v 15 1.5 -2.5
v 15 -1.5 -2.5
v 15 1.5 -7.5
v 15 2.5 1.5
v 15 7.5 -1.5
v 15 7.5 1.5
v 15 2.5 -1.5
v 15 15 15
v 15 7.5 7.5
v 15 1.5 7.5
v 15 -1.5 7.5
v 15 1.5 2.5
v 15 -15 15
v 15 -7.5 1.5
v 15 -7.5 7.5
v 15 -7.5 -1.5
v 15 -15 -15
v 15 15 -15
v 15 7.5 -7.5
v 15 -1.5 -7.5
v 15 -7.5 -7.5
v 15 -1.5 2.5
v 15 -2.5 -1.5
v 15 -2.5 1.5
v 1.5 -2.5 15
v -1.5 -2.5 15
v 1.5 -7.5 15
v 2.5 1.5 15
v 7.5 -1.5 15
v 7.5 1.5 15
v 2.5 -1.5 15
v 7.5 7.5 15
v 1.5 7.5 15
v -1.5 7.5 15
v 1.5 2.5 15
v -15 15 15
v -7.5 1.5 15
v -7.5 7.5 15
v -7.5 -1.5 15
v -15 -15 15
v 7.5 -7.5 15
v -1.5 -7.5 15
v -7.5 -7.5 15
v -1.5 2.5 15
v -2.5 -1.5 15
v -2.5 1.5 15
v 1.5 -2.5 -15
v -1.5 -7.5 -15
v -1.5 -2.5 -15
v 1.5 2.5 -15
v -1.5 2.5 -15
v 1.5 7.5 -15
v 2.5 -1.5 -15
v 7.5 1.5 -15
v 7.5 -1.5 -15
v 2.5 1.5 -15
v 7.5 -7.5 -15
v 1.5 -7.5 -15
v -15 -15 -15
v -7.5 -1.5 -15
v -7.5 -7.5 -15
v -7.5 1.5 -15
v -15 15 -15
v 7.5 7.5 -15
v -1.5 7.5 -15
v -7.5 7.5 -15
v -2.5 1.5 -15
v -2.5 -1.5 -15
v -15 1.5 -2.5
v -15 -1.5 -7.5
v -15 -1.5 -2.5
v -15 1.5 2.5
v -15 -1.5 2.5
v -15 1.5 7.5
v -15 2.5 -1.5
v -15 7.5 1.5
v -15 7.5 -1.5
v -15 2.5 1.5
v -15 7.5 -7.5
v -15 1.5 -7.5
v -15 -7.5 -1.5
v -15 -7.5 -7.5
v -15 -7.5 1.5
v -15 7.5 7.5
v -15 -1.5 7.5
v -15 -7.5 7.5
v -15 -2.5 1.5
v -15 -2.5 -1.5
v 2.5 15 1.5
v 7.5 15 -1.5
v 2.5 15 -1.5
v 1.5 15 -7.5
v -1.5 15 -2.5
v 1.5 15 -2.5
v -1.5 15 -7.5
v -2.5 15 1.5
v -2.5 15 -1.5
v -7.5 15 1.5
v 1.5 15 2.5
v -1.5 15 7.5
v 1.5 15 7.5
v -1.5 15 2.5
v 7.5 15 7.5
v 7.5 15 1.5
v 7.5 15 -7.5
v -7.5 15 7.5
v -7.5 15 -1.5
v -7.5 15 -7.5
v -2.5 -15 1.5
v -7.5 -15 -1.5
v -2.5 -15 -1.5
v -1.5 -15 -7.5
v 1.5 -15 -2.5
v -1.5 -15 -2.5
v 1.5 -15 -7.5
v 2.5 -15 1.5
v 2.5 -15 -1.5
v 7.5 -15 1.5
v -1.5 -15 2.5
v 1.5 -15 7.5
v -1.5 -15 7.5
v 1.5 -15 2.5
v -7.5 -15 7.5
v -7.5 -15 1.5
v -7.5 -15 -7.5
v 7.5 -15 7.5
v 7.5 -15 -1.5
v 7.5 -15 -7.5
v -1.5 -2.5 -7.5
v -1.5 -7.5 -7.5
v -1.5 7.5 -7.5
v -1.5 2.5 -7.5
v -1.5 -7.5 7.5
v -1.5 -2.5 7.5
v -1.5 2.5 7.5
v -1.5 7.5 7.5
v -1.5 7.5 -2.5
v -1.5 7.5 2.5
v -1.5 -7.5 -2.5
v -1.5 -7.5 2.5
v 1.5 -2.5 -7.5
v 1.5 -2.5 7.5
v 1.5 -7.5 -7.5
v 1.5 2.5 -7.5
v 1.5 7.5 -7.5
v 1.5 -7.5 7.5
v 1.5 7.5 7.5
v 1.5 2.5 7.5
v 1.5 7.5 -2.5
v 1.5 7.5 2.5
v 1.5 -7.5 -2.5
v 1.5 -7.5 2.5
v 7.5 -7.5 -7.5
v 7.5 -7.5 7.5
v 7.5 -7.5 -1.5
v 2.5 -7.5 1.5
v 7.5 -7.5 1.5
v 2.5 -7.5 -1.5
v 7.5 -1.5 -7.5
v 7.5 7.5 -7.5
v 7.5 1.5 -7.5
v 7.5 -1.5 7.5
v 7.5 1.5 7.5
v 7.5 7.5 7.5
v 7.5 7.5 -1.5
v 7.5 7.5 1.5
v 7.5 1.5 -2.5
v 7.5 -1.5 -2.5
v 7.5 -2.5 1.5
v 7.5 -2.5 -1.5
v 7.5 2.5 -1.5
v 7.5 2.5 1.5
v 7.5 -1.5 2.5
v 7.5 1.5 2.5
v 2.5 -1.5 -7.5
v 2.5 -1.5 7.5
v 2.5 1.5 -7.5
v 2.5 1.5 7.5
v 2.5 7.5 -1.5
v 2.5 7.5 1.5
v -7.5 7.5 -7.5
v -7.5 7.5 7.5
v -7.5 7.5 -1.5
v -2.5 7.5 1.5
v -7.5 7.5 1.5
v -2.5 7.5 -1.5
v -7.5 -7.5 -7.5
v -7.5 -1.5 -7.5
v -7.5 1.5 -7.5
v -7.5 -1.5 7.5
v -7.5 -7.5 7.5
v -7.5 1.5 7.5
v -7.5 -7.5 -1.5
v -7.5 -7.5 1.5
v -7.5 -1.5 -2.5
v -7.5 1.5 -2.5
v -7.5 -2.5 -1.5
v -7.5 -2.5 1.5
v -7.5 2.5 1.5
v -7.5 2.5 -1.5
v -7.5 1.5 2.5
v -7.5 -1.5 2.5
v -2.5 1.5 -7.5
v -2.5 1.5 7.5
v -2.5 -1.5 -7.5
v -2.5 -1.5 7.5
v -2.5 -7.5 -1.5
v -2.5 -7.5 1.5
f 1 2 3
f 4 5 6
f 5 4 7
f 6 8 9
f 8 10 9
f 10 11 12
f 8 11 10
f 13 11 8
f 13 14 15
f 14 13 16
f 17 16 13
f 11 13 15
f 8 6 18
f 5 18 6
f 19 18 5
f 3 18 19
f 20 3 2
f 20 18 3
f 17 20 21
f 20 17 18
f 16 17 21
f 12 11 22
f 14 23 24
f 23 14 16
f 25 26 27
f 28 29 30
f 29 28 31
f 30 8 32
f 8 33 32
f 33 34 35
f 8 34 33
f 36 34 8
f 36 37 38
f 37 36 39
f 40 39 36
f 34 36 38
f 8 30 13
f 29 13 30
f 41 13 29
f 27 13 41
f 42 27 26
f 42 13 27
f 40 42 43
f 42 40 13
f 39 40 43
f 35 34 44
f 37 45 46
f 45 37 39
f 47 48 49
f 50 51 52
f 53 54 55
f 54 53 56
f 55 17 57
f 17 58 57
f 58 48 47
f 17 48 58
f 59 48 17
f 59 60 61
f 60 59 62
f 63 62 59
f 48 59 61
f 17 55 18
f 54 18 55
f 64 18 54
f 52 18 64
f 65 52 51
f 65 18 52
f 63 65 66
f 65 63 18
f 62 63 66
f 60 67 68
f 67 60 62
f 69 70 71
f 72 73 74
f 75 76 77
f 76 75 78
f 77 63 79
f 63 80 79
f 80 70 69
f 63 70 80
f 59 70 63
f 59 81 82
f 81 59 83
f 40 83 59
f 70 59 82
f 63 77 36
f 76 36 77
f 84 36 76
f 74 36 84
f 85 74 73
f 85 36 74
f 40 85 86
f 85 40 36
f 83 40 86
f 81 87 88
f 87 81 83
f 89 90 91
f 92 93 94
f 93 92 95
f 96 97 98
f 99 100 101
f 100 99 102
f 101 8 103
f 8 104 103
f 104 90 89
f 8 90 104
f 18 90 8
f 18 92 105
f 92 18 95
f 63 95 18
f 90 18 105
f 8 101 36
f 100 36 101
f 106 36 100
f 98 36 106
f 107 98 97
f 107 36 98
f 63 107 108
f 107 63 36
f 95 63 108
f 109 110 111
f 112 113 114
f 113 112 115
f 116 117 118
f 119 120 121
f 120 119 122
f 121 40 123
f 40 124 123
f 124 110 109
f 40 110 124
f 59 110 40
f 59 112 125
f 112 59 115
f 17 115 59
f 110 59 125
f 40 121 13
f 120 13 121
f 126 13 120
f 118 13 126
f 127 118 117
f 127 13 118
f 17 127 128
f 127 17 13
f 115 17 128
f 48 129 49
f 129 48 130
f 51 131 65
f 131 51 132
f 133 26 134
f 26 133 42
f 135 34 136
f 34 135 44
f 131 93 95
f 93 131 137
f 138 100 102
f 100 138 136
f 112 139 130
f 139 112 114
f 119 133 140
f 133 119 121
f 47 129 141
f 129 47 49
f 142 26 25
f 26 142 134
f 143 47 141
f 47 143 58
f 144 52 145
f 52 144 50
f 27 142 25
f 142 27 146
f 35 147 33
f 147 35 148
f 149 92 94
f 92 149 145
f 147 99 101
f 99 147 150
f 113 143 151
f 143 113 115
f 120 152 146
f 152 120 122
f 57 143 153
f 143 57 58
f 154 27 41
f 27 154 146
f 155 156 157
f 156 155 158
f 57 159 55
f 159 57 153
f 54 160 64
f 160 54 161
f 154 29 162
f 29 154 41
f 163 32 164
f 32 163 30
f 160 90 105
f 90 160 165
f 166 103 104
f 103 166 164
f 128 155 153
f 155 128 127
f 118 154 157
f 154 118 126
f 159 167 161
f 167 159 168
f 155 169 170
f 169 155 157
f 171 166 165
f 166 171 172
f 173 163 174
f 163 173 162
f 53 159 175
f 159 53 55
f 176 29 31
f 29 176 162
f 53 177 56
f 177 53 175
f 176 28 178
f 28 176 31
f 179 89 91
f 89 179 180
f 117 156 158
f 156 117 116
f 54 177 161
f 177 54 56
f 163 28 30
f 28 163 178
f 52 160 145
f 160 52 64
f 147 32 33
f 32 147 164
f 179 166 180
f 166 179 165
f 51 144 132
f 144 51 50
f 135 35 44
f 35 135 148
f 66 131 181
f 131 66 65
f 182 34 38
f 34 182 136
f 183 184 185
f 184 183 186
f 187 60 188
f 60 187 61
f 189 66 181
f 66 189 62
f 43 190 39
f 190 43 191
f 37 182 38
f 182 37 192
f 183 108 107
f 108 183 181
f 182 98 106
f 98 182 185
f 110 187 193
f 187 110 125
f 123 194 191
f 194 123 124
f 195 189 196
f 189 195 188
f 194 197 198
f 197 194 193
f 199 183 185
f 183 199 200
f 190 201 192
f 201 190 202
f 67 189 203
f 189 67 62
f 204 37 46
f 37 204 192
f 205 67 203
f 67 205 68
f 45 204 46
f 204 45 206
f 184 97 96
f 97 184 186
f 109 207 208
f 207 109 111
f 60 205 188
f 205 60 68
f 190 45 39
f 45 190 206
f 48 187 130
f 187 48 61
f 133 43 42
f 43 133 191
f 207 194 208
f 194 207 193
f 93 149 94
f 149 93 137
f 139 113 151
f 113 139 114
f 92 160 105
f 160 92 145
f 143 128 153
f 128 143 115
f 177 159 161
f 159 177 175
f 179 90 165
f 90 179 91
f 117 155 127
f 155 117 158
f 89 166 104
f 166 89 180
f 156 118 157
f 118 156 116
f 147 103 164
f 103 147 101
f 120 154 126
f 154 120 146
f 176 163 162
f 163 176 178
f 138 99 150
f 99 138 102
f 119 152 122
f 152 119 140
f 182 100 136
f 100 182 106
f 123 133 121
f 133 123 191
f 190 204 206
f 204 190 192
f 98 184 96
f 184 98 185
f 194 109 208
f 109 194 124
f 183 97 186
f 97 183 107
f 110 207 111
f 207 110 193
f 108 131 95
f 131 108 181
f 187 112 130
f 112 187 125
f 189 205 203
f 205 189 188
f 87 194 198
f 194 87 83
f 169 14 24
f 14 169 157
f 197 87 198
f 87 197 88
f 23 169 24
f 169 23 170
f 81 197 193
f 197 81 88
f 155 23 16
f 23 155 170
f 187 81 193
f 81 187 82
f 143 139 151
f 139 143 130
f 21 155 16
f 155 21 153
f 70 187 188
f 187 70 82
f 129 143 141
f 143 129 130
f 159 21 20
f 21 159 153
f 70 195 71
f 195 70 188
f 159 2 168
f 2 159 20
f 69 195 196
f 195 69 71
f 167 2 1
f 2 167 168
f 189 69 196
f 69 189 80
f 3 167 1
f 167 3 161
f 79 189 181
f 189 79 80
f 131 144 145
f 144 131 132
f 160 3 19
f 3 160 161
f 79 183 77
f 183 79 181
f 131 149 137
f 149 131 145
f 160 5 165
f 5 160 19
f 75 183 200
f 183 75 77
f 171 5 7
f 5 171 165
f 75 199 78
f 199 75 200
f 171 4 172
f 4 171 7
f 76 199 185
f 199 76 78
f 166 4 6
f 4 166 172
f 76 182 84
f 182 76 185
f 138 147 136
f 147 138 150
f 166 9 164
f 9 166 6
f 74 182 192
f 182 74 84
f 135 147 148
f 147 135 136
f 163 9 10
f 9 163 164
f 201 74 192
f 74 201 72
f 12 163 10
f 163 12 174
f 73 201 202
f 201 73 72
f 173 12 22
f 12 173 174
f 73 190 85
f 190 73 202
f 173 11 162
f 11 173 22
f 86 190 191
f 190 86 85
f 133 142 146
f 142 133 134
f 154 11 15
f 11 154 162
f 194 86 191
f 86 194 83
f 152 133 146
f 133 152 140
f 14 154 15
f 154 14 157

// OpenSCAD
IN_MM = 25.4;
$fn = 32;

wall_th = 2;

beam_w = 15;
beam_notch_d = 5;
beam_notch_w = 3;
beam_hole_or = 3/2;

module beam(length=50) {
    translate([0, 0, -length/2])
    linear_extrude(length) {
        difference() {
            square([beam_w, beam_w], center=true);
            for (i=[0:3]) {
                rotate([0, 0, 90 * i]) {
                    translate([beam_w/2 - beam_notch_d / 2, 0, 0]) {
                        square([beam_notch_d, beam_notch_w], center=true);
                    }
                }
            }
            //circle(r=beam_hole_or);
        }
    }
}

module mount_block(ir) {
    block_outside = 2*ir + 2 * wall_th;
    difference() {
        union() {
            translate([0, 0, wall_th/2])
                cube([3 * beam_w, beam_w, wall_th], center=true);
            translate([0, 0, block_outside/4])
                cube([block_outside, beam_w, block_outside/2], center=true);
            translate([0, 0, ir + wall_th])
                rotate([90, 0, 0]) 
                cylinder(r=block_outside/2, h=beam_w, center=true);
            * translate([ir + wall_th, 0, sqrt(2)/4*block_brace_w + wall_th/2])
                rotate([0, 45, 0])
                cube([block_brace_w, beam_w, block_brace_w/2], center=true);
            * translate([-ir - wall_th, 0, sqrt(2)/4*block_brace_w + wall_th/2])
                rotate([0, -45, 0])
                cube([block_brace_w, beam_w, block_brace_w/2], center=true);
            translate([-ir - wall_th + 1, -beam_w/2 + block_brace_w/4, sqrt(2)/4*block_brace_w])
                rotate([0, -45, 0])
                cube([beam_w, block_brace_w/2, beam_w], center=true);
            * translate([-ir - wall_th + 1, beam_w/2 - block_brace_w/4, sqrt(2)/4*block_brace_w])
                rotate([0, -45, 0])
                cube([beam_w, block_brace_w/2, beam_w], center=true);
            translate([ir + wall_th - 1, -beam_w/2 + block_brace_w/4, sqrt(2)/4*block_brace_w])
                rotate([0, 45, 0])
                cube([beam_w, block_brace_w/2, beam_w], center=true);
            * translate([ir + wall_th - 1, beam_w/2 - block_brace_w/4, sqrt(2)/4*block_brace_w])
                rotate([0, 45, 0])
                cube([beam_w, block_brace_w/2, beam_w], center=true);
        }
        translate([0, 0, ir + wall_th])
            rotate([90, 0, 0]) 
            cylinder(r=ir, h=beam_w+1, center=true, $fn=64);
        translate([beam_w, 0, 0])
            cylinder(r=beam_hole_or, h=wall_th*2);
        translate([-beam_w, 0, 0])
            cylinder(r=beam_hole_or, h=wall_th*2);
        
        translate([0, 0, -beam_w/2])
            cube([3*beam_w + 1, beam_w + 1, beam_w], center=true);
    }
}

bearing_h = 7;
bearing_ir = 4;
bearing_or = 11;
block_brace_w = 5;
module pillow_block() {
   mount_block(bearing_or);
}

module corner_mount() {
    difference() {
        cube(2*beam_w, center=true);
        
        translate([0, 0, 0])
            beam(beam_w*2);
        * translate([0, 0, -beam_w])
            beam(beam_w);
        translate([0, 0, 0])
            rotate([90, 0, 0])
            beam(beam_w*2);
        * translate([0, -beam_w, 0])
            rotate([90, 0, 0])
            beam(beam_w);
        translate([0, 0, 0])
            rotate([0, 90, 0])
            beam(beam_w*2);
        * translate([-beam_w, 0, 0])
            rotate([0, 90, 0])
            beam(beam_w);
    }
}

corner_mount();
